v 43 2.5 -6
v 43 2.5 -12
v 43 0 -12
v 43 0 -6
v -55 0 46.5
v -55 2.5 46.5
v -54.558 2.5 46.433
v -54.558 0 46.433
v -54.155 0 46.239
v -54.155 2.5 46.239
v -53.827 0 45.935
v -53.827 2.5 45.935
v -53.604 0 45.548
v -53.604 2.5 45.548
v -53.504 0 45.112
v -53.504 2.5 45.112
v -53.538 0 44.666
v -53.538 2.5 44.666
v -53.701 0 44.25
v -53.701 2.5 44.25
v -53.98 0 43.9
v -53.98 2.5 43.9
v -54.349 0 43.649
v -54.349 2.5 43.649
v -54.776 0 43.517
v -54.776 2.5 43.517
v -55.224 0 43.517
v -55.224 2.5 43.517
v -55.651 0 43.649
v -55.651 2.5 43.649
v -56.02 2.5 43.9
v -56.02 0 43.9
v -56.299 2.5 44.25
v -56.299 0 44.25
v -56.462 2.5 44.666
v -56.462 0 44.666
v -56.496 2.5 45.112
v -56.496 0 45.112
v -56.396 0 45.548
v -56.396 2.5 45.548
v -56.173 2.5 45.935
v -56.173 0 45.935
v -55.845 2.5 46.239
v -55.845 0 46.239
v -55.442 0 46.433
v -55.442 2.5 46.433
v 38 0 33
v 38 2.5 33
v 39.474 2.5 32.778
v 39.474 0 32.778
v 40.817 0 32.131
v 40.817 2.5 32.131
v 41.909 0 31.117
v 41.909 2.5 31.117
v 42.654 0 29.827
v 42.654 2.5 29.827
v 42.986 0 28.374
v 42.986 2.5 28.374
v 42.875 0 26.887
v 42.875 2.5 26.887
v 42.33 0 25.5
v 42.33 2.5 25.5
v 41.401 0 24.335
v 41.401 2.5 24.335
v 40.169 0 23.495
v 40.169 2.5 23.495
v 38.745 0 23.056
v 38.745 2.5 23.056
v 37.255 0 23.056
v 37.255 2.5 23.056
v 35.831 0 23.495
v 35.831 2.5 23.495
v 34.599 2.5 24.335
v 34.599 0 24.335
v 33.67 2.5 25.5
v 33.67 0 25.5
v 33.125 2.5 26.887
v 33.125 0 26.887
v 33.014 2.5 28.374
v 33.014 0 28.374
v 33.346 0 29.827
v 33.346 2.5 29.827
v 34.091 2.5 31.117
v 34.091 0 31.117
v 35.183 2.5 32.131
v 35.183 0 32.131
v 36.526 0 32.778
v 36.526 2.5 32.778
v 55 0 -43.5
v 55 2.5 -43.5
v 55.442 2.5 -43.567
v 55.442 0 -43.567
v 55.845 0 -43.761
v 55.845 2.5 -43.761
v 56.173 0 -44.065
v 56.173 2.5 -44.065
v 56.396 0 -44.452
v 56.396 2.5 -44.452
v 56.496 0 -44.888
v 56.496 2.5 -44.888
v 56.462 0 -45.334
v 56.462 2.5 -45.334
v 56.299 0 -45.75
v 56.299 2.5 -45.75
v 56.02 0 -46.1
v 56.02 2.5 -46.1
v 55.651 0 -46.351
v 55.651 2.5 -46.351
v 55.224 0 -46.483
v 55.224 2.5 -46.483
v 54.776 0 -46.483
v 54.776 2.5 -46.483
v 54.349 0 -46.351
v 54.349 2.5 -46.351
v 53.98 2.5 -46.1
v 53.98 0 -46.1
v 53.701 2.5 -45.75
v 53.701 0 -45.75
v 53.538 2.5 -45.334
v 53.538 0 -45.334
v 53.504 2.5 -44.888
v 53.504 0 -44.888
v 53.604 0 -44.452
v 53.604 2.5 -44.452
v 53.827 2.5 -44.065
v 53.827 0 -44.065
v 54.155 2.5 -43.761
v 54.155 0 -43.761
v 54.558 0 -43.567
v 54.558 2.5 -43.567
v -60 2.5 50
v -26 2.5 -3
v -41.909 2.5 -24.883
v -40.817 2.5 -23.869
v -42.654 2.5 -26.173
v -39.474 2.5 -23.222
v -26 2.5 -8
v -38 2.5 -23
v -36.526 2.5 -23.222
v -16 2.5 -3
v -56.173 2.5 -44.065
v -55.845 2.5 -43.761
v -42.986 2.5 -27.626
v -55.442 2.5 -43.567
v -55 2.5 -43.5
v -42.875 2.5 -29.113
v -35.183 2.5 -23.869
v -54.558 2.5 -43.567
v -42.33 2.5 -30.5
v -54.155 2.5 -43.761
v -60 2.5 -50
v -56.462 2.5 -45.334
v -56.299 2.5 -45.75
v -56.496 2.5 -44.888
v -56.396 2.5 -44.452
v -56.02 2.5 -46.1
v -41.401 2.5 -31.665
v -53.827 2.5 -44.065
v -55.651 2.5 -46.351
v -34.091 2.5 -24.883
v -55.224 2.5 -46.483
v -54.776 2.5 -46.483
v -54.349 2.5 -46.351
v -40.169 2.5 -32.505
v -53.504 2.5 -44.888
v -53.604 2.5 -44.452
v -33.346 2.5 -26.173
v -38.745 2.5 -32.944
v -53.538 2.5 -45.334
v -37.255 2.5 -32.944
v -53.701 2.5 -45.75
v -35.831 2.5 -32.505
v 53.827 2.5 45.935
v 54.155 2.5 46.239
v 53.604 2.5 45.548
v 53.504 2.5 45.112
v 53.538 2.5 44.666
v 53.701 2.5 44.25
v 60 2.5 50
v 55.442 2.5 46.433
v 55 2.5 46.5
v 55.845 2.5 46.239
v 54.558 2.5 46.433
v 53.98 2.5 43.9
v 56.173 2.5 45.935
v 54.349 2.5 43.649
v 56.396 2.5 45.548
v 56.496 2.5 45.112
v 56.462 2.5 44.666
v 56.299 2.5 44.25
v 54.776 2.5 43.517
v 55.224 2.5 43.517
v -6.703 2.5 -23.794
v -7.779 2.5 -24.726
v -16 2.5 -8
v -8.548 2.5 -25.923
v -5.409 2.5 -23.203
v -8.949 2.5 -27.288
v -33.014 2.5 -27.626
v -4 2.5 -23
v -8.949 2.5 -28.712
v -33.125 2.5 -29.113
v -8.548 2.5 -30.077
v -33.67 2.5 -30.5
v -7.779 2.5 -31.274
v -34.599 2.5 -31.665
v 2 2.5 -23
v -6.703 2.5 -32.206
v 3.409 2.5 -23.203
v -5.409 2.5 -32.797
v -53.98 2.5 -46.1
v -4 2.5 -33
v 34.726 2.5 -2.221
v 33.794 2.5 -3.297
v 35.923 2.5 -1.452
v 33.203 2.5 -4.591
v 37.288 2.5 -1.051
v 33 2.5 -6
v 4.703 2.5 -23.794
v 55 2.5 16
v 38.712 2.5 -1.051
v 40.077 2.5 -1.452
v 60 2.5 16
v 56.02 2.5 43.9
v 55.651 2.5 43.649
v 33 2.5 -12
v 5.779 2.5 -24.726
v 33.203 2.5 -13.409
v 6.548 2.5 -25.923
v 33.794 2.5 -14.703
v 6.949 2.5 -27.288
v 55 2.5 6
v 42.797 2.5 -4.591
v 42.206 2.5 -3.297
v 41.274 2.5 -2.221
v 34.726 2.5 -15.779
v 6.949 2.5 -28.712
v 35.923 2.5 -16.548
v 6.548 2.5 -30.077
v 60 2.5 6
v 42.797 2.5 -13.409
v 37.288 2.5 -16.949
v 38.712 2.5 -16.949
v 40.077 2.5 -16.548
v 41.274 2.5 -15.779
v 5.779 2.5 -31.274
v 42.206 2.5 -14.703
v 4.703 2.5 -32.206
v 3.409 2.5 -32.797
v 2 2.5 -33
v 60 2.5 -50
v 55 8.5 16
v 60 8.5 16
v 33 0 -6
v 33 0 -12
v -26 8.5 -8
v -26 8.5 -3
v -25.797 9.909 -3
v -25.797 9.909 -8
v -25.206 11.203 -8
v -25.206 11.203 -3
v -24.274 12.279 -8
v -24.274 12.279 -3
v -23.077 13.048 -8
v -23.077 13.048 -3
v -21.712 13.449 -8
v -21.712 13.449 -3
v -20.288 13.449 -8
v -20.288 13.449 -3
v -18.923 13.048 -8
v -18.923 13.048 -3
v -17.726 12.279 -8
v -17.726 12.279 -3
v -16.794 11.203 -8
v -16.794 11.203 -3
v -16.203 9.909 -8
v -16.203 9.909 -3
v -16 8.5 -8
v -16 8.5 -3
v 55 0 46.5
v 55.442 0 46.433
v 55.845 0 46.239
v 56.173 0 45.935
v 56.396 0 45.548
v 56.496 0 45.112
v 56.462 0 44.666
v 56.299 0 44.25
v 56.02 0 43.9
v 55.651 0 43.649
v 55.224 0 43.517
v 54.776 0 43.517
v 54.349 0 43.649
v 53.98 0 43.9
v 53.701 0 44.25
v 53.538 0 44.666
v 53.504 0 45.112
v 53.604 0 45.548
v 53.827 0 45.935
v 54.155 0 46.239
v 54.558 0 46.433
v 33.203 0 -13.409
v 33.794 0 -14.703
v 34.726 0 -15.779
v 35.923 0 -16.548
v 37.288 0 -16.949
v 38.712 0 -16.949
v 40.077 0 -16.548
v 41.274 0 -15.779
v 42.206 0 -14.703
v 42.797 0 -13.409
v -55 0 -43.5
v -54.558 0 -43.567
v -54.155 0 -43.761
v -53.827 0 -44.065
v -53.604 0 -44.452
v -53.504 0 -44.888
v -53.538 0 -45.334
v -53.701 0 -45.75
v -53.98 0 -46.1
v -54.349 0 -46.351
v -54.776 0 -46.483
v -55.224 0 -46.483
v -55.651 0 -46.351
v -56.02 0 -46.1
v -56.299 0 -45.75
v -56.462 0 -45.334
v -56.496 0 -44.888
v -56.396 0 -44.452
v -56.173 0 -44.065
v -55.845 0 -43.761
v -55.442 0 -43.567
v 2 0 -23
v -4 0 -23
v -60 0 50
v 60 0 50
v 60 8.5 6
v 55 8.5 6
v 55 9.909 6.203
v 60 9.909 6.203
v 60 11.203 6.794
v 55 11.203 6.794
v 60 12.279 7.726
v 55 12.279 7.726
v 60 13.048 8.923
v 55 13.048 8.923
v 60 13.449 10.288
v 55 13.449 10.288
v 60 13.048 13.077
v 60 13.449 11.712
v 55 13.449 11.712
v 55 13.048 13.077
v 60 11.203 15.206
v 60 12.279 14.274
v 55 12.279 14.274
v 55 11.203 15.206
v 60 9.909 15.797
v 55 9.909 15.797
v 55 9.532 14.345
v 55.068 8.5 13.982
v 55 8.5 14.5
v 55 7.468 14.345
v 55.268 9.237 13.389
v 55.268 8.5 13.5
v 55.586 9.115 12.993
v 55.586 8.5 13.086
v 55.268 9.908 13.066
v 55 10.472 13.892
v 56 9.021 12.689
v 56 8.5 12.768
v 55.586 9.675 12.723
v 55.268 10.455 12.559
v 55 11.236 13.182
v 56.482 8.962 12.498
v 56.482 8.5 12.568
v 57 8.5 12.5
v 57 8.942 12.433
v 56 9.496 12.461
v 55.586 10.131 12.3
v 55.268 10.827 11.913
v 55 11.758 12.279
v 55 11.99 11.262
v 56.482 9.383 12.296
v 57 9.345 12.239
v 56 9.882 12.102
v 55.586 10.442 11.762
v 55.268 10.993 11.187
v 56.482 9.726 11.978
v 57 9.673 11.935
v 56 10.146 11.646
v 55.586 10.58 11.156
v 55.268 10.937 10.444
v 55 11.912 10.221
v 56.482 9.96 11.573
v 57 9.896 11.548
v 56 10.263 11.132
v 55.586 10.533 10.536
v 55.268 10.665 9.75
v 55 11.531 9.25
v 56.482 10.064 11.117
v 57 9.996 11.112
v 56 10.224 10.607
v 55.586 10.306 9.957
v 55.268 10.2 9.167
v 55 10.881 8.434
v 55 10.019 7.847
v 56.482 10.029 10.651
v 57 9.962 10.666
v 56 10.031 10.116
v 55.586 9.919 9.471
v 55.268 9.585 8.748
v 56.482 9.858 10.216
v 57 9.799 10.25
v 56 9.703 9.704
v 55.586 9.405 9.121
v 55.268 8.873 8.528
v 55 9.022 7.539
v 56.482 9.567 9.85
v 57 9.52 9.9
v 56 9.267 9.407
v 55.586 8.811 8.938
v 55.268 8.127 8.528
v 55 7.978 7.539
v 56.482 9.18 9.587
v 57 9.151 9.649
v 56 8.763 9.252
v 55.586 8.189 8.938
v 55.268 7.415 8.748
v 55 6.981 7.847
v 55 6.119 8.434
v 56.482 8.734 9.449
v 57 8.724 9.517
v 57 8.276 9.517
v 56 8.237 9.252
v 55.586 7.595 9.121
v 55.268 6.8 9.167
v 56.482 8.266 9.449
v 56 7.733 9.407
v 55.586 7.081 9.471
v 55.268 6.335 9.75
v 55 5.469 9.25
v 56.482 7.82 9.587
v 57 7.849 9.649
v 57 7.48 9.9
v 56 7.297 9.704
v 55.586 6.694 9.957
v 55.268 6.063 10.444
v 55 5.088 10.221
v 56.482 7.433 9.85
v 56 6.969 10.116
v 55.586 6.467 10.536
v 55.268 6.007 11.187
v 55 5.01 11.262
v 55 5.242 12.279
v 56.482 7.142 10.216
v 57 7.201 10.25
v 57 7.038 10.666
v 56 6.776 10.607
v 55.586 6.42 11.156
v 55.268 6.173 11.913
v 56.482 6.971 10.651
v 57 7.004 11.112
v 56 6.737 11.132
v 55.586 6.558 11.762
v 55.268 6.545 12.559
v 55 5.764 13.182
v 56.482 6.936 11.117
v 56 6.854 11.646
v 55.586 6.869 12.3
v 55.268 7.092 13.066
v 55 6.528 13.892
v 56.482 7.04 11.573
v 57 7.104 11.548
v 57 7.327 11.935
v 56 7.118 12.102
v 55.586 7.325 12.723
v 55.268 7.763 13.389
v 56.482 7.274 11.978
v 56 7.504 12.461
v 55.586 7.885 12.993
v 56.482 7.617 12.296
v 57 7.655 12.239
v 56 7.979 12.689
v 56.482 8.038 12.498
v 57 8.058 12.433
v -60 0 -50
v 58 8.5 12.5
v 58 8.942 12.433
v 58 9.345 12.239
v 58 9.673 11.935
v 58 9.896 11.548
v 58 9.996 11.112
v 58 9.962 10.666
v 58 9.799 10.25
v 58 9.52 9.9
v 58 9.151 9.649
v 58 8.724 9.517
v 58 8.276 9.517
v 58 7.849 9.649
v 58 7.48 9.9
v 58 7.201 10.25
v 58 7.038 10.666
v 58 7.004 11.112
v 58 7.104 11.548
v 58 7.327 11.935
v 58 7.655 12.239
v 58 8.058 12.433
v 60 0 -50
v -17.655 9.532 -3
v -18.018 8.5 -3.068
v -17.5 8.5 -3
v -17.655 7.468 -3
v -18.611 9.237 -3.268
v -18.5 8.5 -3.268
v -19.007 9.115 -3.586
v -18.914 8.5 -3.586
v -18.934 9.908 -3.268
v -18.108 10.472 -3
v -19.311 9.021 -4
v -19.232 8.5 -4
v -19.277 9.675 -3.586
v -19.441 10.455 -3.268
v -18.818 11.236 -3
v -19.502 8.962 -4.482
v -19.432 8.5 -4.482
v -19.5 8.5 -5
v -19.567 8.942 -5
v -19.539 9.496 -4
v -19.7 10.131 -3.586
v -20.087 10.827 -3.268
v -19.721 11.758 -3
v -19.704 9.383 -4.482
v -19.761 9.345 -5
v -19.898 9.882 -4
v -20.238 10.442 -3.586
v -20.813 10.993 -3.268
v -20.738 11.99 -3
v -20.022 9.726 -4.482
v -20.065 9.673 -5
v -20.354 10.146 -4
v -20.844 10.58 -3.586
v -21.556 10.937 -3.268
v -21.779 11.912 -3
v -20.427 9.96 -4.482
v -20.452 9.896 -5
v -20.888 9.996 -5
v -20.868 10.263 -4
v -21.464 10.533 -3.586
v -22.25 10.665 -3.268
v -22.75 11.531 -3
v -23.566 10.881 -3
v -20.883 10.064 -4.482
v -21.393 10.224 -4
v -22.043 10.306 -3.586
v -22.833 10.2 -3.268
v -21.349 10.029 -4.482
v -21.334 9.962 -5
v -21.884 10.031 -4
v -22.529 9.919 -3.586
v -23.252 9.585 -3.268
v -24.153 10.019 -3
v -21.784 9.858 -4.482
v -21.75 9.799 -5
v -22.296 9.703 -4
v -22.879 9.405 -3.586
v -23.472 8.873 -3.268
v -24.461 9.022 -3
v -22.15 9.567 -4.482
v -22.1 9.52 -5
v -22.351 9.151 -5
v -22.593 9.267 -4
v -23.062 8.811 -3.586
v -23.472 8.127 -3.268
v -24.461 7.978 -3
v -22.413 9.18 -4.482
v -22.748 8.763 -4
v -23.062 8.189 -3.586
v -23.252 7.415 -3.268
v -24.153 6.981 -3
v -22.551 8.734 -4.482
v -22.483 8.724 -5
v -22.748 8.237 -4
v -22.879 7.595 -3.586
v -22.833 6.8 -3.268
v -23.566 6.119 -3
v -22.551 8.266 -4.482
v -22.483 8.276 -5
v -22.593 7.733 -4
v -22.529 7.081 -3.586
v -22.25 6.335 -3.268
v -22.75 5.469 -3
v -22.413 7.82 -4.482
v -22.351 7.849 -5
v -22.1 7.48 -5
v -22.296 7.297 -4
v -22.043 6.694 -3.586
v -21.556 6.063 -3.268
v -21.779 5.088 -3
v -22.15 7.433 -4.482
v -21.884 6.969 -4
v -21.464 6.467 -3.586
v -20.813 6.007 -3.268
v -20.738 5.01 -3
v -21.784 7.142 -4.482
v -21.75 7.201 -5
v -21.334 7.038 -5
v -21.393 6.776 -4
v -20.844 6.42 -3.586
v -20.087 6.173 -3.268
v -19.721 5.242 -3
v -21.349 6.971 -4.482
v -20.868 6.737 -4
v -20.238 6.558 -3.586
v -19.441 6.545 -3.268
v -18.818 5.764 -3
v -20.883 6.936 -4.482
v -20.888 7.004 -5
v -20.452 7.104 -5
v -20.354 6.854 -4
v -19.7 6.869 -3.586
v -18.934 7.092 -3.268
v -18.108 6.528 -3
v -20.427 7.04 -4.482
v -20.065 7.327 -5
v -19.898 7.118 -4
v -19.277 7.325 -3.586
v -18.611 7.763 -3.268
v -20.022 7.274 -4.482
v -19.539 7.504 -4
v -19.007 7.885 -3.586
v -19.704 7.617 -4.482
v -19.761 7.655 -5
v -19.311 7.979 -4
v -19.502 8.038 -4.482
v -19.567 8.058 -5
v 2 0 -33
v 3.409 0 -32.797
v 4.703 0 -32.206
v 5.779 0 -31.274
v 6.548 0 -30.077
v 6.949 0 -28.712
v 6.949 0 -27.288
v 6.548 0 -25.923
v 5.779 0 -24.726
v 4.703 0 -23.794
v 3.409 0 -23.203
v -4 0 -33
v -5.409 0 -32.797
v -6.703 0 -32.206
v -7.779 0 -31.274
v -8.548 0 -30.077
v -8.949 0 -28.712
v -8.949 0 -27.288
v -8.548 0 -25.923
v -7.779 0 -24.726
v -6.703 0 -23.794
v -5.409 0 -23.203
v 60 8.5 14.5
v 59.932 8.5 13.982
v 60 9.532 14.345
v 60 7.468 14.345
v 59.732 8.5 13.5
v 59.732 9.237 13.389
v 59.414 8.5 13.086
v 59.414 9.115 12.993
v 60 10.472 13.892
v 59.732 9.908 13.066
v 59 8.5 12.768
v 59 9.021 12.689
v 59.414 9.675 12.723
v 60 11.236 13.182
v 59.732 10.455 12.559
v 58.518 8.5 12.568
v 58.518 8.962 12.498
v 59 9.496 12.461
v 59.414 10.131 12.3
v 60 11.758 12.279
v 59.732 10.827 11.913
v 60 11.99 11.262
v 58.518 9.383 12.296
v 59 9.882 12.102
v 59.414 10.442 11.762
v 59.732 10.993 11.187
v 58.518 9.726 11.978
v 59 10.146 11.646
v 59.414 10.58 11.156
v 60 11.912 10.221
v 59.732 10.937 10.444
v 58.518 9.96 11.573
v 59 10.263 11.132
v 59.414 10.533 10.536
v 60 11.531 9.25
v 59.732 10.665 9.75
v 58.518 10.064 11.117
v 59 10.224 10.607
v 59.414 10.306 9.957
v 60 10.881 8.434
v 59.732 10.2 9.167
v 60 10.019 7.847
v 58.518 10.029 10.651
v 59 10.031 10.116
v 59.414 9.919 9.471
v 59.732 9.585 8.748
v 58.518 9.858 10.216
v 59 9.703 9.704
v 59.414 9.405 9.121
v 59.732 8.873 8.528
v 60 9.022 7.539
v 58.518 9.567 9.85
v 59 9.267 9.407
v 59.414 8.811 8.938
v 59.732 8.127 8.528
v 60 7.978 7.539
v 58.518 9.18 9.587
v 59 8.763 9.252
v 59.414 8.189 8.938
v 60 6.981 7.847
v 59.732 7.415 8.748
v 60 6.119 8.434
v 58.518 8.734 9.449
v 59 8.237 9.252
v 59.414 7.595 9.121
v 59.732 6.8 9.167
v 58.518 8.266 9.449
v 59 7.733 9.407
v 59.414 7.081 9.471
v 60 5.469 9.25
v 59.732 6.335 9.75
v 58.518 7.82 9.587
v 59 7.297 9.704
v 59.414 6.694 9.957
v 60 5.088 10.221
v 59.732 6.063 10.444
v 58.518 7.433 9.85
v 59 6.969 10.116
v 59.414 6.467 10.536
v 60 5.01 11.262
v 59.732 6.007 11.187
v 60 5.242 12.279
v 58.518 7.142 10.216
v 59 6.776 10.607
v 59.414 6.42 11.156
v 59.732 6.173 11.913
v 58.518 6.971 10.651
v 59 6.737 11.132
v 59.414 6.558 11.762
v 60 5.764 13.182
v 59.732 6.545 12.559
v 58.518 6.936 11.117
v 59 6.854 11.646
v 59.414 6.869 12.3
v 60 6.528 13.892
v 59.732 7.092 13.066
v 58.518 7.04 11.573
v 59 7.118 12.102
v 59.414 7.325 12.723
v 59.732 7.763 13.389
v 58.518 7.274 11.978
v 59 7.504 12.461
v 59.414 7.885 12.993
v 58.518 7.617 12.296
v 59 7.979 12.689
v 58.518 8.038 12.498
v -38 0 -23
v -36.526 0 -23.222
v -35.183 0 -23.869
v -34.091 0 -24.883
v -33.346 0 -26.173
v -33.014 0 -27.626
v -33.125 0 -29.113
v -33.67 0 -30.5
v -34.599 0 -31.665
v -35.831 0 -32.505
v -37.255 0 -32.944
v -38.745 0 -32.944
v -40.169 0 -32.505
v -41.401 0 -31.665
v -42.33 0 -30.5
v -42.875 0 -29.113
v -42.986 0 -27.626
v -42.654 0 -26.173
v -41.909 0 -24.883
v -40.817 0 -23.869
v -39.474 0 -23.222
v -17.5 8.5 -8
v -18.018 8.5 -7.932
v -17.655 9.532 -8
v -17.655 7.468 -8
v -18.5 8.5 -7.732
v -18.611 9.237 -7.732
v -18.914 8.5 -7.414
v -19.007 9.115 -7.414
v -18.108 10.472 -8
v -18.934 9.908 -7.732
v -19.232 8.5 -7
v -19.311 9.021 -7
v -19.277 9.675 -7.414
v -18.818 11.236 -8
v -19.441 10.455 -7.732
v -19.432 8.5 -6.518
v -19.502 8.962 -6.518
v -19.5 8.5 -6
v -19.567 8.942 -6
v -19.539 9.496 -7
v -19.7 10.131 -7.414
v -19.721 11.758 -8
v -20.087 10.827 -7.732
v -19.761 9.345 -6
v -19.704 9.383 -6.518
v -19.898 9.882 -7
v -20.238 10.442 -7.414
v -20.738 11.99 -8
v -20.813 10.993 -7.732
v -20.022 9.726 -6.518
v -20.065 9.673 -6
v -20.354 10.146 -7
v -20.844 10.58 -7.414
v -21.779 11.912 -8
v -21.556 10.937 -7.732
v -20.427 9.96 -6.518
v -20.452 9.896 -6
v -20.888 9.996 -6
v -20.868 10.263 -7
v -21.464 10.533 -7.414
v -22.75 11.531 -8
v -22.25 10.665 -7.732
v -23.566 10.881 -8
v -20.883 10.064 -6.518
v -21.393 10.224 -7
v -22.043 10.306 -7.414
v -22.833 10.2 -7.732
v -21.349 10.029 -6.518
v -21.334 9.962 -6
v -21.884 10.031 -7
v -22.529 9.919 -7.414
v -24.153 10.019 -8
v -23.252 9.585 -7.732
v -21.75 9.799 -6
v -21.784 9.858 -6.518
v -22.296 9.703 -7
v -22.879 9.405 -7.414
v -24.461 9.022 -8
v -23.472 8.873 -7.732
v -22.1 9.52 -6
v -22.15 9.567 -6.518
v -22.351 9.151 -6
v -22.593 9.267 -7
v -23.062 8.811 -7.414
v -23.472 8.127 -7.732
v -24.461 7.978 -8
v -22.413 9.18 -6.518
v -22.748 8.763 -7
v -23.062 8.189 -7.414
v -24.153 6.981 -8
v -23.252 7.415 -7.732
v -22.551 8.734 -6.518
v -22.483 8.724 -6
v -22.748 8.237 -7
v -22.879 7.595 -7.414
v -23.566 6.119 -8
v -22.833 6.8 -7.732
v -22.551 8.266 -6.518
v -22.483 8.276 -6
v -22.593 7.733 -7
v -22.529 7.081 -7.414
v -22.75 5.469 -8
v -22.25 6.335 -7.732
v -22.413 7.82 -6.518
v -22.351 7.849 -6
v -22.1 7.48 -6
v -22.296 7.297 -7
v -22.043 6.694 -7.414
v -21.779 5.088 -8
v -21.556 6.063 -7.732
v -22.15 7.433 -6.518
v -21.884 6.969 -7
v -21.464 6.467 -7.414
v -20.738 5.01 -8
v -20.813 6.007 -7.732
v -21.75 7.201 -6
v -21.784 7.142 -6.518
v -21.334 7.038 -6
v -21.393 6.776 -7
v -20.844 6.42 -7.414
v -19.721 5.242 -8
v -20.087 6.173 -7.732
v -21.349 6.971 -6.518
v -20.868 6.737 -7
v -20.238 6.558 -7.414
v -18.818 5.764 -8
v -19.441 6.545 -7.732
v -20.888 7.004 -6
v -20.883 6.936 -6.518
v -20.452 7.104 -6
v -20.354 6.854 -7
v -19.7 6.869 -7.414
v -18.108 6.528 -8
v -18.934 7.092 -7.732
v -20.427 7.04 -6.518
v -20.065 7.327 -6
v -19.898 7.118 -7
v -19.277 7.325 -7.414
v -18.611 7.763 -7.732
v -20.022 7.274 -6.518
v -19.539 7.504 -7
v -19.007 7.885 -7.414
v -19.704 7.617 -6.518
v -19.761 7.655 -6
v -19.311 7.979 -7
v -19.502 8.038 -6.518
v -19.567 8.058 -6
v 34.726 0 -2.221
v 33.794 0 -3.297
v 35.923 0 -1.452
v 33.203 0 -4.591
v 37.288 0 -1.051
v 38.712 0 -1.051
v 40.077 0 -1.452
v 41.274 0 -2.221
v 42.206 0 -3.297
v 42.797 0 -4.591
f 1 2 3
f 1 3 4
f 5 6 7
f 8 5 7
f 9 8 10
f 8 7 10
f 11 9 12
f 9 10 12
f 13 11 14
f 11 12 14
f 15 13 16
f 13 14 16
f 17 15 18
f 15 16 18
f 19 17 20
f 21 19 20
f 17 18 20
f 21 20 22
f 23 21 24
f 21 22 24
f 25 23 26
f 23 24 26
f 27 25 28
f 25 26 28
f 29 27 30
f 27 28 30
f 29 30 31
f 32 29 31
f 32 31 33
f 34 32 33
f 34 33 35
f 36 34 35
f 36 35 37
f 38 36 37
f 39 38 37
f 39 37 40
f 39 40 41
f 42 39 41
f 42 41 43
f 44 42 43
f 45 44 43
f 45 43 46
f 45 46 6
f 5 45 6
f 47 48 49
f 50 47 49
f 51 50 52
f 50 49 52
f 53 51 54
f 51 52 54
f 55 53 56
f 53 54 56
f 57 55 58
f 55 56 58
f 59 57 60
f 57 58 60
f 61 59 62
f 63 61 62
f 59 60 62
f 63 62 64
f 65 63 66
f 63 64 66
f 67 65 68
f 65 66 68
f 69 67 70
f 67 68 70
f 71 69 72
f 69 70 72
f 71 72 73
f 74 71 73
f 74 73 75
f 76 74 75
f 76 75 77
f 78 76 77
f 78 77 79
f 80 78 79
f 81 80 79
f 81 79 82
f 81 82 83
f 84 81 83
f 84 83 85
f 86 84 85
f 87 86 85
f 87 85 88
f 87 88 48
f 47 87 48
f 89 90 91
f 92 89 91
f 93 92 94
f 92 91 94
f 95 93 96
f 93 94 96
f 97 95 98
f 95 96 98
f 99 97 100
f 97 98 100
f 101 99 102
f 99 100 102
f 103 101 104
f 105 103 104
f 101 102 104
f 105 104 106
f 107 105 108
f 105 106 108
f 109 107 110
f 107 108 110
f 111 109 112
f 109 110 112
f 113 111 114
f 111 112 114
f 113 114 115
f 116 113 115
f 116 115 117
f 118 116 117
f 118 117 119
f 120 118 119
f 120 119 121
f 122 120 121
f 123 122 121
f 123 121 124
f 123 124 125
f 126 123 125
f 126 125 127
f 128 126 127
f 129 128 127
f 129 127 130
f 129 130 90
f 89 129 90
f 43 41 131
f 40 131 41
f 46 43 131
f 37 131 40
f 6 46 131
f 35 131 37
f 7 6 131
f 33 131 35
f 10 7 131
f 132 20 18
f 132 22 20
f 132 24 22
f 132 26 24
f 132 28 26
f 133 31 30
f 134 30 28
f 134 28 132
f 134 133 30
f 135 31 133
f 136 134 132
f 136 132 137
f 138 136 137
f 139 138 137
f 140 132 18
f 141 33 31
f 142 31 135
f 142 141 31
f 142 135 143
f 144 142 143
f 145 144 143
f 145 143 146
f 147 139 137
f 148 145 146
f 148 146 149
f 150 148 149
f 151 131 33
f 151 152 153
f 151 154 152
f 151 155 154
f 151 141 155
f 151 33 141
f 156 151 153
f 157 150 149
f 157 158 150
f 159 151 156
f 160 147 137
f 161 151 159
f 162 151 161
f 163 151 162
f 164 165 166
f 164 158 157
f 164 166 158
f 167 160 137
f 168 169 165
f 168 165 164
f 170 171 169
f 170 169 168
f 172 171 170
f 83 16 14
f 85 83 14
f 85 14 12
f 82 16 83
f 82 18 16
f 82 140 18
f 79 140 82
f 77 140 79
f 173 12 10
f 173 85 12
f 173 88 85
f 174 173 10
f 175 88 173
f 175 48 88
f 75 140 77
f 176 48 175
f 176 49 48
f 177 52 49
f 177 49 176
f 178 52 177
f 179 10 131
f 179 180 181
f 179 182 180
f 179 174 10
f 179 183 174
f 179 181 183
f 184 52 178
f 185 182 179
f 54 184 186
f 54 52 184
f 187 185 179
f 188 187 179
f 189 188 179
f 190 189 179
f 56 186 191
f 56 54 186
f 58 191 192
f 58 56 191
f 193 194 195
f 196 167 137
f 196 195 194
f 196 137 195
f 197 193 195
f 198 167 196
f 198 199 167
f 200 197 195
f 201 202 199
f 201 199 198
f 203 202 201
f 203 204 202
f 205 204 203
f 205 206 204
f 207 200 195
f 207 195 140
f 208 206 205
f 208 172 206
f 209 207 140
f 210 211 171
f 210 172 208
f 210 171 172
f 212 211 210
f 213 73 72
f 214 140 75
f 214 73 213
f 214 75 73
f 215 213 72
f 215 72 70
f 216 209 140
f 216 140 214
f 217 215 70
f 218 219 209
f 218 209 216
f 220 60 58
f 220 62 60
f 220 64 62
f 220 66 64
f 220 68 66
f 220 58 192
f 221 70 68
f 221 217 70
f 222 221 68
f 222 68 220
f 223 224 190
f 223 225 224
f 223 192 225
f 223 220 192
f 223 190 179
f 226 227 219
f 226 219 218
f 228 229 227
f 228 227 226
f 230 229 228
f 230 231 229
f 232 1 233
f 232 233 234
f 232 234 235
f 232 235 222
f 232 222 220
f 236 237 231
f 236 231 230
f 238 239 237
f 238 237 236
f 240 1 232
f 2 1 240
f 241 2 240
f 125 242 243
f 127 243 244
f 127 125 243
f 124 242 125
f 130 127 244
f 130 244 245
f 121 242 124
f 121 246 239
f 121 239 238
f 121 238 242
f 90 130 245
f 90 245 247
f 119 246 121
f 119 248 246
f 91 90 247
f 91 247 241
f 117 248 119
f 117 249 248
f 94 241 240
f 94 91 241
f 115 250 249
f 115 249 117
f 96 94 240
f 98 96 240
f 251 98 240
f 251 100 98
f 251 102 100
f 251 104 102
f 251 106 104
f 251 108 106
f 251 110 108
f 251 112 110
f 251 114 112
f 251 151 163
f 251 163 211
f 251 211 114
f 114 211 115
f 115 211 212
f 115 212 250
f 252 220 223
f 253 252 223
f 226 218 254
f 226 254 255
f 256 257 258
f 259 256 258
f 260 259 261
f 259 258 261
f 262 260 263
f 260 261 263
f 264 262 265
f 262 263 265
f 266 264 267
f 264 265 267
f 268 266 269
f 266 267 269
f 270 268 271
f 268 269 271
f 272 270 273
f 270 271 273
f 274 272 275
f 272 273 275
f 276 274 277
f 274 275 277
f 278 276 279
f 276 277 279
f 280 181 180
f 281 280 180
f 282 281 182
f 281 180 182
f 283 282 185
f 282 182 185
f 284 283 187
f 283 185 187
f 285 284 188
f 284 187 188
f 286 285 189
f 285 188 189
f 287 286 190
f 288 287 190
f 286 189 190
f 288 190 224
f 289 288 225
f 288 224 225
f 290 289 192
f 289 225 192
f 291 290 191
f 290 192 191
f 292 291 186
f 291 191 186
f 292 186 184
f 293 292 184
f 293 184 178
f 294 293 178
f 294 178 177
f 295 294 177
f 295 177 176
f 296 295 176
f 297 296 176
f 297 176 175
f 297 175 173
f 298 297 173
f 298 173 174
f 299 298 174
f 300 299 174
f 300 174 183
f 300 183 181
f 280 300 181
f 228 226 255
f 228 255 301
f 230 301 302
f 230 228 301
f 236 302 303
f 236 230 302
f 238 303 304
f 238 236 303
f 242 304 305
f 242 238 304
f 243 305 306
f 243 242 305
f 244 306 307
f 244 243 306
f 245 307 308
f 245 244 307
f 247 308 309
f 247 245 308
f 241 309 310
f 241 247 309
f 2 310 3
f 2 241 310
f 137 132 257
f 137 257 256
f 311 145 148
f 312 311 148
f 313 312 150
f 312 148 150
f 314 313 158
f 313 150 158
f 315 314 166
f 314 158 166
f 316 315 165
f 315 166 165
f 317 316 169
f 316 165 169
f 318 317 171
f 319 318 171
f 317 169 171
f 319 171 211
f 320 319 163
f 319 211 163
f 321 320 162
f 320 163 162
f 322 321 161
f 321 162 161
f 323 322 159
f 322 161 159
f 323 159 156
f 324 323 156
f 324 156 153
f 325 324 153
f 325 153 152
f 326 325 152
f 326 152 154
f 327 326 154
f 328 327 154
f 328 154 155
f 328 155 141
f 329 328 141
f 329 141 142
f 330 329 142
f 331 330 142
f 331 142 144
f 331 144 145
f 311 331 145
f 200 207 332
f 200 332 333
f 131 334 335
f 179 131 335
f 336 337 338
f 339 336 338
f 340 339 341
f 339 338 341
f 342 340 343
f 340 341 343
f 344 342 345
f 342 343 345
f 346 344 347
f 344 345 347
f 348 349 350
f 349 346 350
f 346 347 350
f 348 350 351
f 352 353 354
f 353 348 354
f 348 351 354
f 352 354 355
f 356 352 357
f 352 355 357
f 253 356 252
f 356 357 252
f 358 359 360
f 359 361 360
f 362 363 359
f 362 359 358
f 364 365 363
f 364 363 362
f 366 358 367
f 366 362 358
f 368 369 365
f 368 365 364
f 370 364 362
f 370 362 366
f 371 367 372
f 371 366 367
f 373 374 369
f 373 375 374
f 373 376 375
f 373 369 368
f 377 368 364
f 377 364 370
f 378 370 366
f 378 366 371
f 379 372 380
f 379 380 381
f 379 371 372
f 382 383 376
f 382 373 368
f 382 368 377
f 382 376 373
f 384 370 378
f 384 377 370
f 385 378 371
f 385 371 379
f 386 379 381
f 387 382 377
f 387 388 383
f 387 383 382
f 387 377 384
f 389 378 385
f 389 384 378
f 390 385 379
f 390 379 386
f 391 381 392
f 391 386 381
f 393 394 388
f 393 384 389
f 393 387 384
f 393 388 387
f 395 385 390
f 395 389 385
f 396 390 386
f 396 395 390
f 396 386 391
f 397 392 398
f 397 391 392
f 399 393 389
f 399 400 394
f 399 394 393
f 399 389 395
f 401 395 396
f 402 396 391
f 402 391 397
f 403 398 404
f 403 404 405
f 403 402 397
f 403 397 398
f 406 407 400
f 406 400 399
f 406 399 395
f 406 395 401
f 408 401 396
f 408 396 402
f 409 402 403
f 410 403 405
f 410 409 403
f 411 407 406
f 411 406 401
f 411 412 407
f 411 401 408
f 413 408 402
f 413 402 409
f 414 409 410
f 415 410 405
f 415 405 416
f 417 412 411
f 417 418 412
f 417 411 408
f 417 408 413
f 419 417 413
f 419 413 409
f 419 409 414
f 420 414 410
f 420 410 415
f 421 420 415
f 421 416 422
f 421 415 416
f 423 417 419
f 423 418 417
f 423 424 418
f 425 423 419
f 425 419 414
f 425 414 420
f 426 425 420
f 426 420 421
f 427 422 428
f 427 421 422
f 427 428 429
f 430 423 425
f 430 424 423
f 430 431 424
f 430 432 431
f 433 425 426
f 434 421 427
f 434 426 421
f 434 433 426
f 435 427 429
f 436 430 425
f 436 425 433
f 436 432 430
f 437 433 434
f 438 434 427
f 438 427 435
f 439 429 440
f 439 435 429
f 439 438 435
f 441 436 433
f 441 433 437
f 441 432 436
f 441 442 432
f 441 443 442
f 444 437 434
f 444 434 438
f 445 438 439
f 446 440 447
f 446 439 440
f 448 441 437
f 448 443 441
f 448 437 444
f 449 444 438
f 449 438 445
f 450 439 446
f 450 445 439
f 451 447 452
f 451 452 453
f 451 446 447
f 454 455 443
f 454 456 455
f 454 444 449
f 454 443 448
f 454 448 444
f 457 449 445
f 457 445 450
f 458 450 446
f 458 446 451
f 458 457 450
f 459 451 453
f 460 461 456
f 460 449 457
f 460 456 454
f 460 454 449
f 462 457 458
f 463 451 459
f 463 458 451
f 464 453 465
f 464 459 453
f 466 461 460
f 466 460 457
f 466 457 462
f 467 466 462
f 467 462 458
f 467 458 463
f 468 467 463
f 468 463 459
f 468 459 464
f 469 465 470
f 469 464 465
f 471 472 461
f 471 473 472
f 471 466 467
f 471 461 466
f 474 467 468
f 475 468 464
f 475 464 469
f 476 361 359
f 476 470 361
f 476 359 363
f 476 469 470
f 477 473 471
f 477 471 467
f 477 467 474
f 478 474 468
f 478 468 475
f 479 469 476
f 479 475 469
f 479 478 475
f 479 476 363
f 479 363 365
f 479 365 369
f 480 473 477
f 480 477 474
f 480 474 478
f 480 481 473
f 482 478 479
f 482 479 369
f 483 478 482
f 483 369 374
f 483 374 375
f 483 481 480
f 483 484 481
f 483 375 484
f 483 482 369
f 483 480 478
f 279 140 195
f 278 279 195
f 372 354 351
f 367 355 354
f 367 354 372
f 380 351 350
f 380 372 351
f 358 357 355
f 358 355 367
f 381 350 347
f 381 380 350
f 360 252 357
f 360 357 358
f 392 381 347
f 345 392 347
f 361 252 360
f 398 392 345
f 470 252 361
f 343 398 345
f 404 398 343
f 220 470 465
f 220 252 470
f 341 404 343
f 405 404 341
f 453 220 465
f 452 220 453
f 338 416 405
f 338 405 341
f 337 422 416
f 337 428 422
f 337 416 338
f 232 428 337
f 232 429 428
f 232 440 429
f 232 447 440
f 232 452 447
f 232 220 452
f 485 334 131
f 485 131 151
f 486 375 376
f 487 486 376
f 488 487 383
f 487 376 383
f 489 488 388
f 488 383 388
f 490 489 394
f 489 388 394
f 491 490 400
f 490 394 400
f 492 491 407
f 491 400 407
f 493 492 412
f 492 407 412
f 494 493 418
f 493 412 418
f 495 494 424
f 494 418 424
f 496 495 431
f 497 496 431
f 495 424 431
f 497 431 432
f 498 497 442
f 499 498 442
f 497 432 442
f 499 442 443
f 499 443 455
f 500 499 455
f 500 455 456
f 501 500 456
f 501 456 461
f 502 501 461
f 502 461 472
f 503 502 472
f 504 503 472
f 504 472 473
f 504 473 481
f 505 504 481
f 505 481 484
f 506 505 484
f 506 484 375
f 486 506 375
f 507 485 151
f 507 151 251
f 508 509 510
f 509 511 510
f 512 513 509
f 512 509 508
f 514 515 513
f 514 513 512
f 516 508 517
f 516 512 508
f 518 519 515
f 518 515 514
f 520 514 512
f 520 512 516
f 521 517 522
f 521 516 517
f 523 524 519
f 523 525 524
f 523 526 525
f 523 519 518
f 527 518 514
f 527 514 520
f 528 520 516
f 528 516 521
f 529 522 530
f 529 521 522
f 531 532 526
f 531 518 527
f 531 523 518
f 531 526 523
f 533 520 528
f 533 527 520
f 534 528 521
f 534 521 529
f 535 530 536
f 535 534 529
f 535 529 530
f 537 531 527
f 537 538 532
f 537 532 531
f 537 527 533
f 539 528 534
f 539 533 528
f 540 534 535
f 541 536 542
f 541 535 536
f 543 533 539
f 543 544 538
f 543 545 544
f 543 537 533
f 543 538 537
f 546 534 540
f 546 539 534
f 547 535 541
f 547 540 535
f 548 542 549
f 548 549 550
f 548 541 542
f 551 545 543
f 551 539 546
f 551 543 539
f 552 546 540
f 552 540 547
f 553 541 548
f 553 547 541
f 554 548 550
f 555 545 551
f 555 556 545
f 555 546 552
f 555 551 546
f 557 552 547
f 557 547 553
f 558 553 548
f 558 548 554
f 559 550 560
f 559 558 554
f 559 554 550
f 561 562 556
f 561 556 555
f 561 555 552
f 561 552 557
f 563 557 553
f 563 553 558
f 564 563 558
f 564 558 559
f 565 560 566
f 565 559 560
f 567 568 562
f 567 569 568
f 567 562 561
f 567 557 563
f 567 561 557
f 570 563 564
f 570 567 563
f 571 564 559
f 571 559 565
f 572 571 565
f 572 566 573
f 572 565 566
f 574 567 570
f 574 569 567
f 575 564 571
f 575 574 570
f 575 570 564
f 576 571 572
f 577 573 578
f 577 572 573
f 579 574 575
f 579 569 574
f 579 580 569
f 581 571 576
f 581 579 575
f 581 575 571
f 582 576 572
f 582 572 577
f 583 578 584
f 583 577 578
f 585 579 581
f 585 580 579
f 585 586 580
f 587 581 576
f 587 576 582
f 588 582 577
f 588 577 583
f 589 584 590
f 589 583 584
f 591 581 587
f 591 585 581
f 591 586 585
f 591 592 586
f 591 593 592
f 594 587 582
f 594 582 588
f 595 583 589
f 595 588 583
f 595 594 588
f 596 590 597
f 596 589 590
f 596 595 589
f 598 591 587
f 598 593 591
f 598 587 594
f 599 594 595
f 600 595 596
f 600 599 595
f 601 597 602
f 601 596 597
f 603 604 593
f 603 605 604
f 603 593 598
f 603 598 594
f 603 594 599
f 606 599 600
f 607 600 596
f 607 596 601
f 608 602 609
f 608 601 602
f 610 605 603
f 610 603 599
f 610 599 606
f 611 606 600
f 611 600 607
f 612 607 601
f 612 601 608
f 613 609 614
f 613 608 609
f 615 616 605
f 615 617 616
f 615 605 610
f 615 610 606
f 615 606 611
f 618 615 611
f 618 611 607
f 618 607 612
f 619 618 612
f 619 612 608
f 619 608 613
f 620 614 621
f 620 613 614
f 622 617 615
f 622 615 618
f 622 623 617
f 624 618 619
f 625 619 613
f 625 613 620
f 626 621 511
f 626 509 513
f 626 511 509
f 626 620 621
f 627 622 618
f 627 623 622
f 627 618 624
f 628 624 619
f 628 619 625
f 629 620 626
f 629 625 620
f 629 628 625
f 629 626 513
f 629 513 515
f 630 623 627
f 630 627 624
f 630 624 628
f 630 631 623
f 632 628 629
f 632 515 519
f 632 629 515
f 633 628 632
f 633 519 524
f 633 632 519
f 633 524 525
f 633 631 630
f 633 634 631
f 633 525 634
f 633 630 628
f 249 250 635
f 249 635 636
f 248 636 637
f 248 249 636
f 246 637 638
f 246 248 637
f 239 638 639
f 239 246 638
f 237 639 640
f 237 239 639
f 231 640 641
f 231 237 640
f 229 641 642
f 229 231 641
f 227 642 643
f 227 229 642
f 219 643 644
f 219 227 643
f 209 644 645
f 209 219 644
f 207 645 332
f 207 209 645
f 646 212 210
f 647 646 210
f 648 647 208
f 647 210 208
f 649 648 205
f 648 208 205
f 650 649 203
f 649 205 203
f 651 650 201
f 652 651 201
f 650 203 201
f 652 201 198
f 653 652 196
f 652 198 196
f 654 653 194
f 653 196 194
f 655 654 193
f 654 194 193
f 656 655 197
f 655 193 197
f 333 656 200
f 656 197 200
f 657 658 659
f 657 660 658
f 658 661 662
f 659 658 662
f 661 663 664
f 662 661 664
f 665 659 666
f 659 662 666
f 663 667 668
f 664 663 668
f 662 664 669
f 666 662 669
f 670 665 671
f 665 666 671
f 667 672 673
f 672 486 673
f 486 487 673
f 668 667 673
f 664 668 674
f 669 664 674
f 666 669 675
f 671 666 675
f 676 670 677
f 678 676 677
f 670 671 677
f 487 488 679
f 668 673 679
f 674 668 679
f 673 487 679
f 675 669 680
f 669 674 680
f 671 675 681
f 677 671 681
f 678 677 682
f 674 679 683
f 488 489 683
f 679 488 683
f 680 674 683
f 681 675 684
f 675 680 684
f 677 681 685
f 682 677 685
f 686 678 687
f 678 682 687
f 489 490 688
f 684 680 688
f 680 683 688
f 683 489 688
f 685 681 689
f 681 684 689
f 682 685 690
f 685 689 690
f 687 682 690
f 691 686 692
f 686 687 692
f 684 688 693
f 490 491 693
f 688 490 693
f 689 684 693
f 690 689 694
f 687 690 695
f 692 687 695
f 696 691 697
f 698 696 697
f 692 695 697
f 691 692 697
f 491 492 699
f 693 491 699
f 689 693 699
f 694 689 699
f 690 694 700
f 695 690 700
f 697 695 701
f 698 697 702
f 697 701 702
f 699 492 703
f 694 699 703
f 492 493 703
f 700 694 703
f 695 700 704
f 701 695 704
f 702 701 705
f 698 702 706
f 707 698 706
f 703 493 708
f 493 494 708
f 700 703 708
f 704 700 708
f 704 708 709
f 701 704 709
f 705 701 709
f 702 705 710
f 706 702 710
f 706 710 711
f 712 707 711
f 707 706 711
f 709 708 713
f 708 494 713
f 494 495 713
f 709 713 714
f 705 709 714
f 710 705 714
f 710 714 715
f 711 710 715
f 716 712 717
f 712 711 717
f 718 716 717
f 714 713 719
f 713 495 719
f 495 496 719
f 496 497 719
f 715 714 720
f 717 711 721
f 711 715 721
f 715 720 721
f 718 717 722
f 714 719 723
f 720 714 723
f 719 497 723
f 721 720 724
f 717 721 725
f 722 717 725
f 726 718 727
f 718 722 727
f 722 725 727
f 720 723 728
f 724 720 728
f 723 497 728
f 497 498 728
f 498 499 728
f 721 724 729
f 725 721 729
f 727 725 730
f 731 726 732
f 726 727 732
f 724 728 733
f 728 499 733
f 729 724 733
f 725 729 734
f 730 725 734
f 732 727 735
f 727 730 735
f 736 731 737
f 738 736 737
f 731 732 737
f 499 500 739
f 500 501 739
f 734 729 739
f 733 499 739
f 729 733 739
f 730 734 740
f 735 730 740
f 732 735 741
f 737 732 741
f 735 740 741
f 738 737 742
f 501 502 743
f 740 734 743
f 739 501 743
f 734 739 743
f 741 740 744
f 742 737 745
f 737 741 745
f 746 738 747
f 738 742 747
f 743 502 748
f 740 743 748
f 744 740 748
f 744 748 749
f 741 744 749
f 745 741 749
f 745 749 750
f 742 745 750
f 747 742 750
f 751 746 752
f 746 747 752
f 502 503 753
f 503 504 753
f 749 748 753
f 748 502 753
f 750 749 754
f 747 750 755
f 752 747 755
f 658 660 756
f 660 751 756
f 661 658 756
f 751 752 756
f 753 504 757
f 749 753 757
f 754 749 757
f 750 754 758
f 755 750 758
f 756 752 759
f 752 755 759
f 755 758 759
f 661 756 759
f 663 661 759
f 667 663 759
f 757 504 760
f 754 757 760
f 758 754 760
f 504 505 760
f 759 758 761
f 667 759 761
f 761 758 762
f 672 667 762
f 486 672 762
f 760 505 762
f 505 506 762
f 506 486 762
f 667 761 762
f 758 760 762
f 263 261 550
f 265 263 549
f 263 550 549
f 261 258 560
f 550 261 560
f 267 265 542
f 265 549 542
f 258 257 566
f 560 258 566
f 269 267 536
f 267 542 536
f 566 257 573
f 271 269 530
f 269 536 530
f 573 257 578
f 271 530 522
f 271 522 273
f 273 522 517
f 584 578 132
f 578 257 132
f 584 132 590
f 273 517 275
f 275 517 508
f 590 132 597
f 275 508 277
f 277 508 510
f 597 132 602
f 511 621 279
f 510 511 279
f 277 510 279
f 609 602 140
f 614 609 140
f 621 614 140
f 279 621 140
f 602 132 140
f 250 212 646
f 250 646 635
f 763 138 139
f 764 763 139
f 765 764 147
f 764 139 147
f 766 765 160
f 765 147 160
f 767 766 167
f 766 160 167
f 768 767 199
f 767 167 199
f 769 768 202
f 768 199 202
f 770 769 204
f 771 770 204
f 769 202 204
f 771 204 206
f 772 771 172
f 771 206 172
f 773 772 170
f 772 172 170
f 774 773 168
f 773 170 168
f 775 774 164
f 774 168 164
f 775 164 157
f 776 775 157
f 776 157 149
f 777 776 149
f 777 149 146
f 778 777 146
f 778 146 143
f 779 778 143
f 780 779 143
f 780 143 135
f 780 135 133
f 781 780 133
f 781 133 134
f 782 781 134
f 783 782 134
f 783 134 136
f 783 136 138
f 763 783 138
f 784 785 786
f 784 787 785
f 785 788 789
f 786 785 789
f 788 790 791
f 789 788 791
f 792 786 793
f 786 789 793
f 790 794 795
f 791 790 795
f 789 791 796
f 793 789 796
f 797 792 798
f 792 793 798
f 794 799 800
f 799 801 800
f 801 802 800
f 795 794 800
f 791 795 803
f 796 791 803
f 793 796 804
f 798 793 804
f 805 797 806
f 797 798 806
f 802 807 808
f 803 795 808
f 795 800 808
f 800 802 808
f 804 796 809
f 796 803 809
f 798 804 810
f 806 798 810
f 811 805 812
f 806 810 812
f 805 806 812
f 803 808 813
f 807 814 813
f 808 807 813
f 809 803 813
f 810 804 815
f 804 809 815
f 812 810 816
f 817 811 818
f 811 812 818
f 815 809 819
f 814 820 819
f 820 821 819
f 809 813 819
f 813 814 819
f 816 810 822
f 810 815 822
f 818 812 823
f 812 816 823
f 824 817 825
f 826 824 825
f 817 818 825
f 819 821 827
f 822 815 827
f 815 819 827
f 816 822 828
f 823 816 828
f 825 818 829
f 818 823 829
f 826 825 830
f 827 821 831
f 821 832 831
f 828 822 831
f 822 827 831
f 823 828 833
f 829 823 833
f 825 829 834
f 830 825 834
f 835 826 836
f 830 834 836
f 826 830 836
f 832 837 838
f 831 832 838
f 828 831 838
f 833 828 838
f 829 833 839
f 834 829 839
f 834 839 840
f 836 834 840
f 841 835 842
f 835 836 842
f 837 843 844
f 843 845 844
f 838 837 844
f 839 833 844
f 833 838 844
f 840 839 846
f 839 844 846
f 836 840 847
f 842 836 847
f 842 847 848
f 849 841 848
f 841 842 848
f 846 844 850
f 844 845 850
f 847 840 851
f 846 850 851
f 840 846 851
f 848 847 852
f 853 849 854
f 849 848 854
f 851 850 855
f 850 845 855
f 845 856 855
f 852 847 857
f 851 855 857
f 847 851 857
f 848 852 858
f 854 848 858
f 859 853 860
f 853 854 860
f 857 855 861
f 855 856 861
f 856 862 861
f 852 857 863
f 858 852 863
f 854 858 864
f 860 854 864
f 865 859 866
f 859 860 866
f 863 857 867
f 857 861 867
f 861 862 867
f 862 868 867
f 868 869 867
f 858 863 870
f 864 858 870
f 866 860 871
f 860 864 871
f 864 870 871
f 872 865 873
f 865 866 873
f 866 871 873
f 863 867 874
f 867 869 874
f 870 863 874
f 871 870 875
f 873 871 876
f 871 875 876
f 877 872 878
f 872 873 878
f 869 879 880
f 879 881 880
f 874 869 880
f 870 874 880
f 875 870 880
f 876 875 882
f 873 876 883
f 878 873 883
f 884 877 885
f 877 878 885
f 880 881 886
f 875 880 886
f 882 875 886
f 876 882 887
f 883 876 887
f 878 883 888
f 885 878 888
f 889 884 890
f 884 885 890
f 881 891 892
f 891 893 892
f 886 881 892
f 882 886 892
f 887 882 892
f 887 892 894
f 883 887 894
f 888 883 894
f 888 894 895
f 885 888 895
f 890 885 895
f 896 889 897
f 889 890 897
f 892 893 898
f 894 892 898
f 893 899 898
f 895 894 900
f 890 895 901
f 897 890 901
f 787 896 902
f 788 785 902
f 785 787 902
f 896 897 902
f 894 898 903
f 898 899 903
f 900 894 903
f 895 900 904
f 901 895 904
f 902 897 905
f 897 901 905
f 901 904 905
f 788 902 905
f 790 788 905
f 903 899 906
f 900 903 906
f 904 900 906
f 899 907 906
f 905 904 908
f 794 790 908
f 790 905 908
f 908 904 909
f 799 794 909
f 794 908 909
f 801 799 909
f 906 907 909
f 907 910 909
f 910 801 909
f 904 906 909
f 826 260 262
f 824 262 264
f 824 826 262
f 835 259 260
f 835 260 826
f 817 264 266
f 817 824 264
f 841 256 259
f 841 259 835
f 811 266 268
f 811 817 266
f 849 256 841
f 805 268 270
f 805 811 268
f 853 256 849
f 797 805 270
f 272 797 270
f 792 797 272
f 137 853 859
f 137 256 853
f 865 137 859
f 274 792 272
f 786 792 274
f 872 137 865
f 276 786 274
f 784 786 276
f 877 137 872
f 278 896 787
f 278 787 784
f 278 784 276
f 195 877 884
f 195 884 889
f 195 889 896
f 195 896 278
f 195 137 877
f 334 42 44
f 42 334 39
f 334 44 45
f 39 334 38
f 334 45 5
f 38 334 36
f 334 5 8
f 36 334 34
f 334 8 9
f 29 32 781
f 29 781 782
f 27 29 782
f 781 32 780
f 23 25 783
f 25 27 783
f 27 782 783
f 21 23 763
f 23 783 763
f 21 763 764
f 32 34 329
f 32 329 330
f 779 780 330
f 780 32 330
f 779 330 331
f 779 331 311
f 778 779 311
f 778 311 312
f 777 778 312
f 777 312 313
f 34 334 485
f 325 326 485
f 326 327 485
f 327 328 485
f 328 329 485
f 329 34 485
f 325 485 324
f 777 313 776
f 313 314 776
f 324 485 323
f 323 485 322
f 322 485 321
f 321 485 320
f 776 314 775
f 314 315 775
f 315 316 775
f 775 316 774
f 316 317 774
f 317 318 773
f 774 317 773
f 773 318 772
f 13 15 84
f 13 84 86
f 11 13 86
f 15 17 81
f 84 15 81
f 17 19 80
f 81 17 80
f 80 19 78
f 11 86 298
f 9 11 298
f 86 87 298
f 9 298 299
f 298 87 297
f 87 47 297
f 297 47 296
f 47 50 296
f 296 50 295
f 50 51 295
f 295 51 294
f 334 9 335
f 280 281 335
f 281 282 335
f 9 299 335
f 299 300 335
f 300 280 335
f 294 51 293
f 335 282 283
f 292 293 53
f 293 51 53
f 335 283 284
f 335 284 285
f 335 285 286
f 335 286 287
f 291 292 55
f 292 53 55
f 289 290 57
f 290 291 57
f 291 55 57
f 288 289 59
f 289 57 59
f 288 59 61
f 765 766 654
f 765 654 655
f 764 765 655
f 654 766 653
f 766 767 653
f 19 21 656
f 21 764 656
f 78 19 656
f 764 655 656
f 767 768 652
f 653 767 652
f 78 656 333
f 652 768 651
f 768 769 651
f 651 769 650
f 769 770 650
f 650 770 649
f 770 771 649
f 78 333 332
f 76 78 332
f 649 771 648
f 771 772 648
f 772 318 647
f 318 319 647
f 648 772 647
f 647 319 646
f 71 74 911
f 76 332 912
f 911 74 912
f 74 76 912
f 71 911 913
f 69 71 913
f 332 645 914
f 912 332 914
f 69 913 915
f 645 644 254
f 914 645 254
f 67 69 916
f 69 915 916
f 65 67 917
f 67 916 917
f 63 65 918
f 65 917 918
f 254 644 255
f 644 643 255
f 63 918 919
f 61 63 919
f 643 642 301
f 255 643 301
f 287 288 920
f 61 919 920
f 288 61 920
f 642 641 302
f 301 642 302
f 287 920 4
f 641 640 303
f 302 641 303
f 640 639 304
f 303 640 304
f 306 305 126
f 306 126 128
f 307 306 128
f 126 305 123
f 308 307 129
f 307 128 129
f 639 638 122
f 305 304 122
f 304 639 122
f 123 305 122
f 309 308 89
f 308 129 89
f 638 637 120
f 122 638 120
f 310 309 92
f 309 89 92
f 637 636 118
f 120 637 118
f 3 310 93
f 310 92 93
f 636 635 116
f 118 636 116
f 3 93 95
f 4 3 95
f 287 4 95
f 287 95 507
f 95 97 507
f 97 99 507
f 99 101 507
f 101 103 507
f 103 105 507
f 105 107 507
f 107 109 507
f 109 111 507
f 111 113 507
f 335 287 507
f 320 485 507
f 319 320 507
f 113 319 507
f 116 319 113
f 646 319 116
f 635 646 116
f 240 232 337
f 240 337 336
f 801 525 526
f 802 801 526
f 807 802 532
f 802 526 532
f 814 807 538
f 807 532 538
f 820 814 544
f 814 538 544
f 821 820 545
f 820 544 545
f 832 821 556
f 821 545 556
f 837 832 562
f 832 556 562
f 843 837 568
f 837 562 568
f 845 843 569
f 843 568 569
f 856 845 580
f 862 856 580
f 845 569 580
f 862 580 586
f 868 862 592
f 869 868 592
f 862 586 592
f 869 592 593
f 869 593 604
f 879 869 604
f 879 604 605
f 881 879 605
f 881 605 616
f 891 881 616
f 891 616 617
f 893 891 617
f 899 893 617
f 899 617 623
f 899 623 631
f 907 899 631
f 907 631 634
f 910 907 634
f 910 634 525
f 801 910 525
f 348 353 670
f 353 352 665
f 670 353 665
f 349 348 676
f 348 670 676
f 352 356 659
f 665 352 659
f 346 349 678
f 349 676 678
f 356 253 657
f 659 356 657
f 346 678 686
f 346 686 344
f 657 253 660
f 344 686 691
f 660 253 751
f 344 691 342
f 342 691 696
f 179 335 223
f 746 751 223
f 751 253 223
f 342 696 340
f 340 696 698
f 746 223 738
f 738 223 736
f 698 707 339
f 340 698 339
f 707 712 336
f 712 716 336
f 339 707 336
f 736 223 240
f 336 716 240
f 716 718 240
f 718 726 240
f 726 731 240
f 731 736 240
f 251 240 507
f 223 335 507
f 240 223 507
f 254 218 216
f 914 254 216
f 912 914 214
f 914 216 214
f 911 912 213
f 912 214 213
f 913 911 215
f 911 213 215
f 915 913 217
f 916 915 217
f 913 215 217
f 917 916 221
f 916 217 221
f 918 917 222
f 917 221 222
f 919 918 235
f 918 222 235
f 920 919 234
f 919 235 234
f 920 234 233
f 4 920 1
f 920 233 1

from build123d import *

# Parameters (mm, degrees)
SKETCH2_W           = 120
SKETCH2_H           = 100
BOSS_EXTRUDE1_DEPTH = 2.5
SKETCH3_R           = 1.5
CUT_EXTRUDE1_DEPTH  = 5
SKETCH4_R           = 5
CUT_EXTRUDE2_DEPTH  = 5
CUT_EXTRUDE3_DEPTH  = 10
SKETCH6_W           = 10
SKETCH6_H           = 5
SKETCH6_W_2         = 5
SKETCH6_H_2         = 10
BOSS_EXTRUDE2_DEPTH = 15
SKETCH7_R           = 1.5
CUT_EXTRUDE4_DEPTH  = 82.946628973
SKETCH8_R           = 1.5
CUT_EXTRUDE5_DEPTH  = 99.001275502
FILLET1_R           = 2
SKETCH9_W           = 10
SKETCH9_H           = 5
SKETCH9_W_2         = 5
SKETCH9_H_2         = 10
CUT_EXTRUDE6_DEPTH  = 15


with BuildPart() as part:
    # Sketch2 → Boss-Extrude1 (new body)
    with BuildSketch(Plane(origin=(0, 0, 0), x_dir=(1, 0, 0), z_dir=(0, 1, 0))):
        Rectangle(SKETCH2_W, SKETCH2_H)
    extrude(amount=BOSS_EXTRUDE1_DEPTH)

    # Sketch3 → Cut-Extrude1 (cut)
    with BuildSketch(Plane(origin=(0, 2.5, 0), x_dir=(1, 0, 0), z_dir=(0, 1, 0))):
        with Locations(Location((-55, 45, 0), (0, 0, 270))):
            Circle(SKETCH3_R)
        with Locations(Location((55, 45, 0), (0, 0, 270))):
            Circle(SKETCH3_R)
        with Locations(Location((55, -45, 0), (0, 0, 270))):
            Circle(SKETCH3_R)
        with Locations(Location((-55, -45, 0), (0, 0, 270))):
            Circle(SKETCH3_R)
    extrude(amount=-CUT_EXTRUDE1_DEPTH, mode=Mode.SUBTRACT)

    # Sketch4 → Cut-Extrude2 (cut)
    with BuildSketch(Plane(origin=(0, 2.5, 0), x_dir=(1, 0, 0), z_dir=(0, 1, 0))):
        with Locations(Location((-38, 28, 0), (0, 0, 270))):
            Circle(SKETCH4_R)
        with Locations(Location((-4, 28, 0), (0, 0, 270))):
            Circle(SKETCH4_R)
        with Locations(Location((38, 6, 0), (0, 0, 270))):
            Circle(SKETCH4_R)
        with Locations(Location((38, -28, 0), (0, 0, 270))):
            Circle(SKETCH4_R)
    extrude(amount=-CUT_EXTRUDE2_DEPTH, mode=Mode.SUBTRACT)

    # Sketch5 → Cut-Extrude3 (cut)
    with BuildSketch(Plane(origin=(0, 2.5, 0), x_dir=(1, 0, 0), z_dir=(0, 1, 0))):
        with BuildLine():
            Line((-4, 33), (2, 33))
            ThreePointArc((2, 33), (7, 28), (2, 23))
            Line((2, 23), (-4, 23))
            ThreePointArc((-4, 23), (-9, 28), (-4, 33))
        make_face()
        with BuildLine():
            Line((33, 6), (33, 12))
            ThreePointArc((33, 12), (38, 17), (43, 12))
            Line((43, 12), (43, 6))
            ThreePointArc((43, 6), (38, 1), (33, 6))
        make_face()
    extrude(amount=-CUT_EXTRUDE3_DEPTH, mode=Mode.SUBTRACT)

    # Sketch6 → Boss-Extrude2 (add)
    with BuildSketch(Plane(origin=(0, 2.5, 0), x_dir=(1, 0, 0), z_dir=(0, 1, 0))):
        with Locations((-21, 5.5)):
            Rectangle(SKETCH6_W, SKETCH6_H)
        with Locations((57.5, -11)):
            Rectangle(SKETCH6_W_2, SKETCH6_H_2)
        with Locations((-21, 47.5)):
            Rectangle(SKETCH6_W, SKETCH6_H)
        with Locations((15.5, -11)):
            Rectangle(SKETCH6_W_2, SKETCH6_H_2)
    extrude(amount=BOSS_EXTRUDE2_DEPTH)

    # Sketch7 → Cut-Extrude4 (cut, through all)
    with BuildSketch(Plane.XY.offset(-3)):
        with Locations((-21, 8.5)):
            Circle(SKETCH7_R)
        with BuildLine():
            Line((-16, 8.5), (-16, 17.5))
            Line((-16, 17.5), (-26, 17.5))
            Line((-26, 17.5), (-26, 8.5))
            ThreePointArc((-26, 8.5), (-21, 13.5), (-16, 8.5))
        make_face()
    extrude(amount=-CUT_EXTRUDE4_DEPTH, mode=Mode.SUBTRACT)

    # Sketch8 → Cut-Extrude5 (cut, through all)
    with BuildSketch(Plane(origin=(13, 0, -13), x_dir=(0, 0, 1), z_dir=(-1, 0, 0))):
        with Locations((24, 8.5)):
            Circle(SKETCH8_R)
        with BuildLine():
            Line((29, 8.5), (29, 17.5))
            Line((29, 17.5), (19, 17.5))
            Line((19, 17.5), (19, 8.5))
            ThreePointArc((19, 8.5), (24, 13.5), (29, 8.5))
        make_face()
    extrude(amount=-CUT_EXTRUDE5_DEPTH, mode=Mode.SUBTRACT)

    # Fillet1
    fillet1_edges = [part.edges().sort_by_distance(p)[0] for p in [
        (-22.5, 8.5, -8),
        (-22.5, 8.5, -50),
        (-22.5, 8.5, -45),
        (-22.5, 8.5, -3),
        (60, 8.5, 9.5),
        (55, 8.5, 9.5),
        (18, 8.5, 9.5),
        (13, 8.5, 9.5),
    ]]
    fillet(fillet1_edges, radius=FILLET1_R)

    # Sketch9 → Cut-Extrude6 (cut)
    with BuildSketch(Plane(origin=(0, 2.5, 0), x_dir=(1, 0, 0), z_dir=(0, 1, 0))):
        with Locations((-21, 47.5)):
            Rectangle(SKETCH9_W, SKETCH9_H)
        with Locations((15.5, -11)):
            Rectangle(SKETCH9_W_2, SKETCH9_H_2)
    extrude(amount=CUT_EXTRUDE6_DEPTH, mode=Mode.SUBTRACT)


solid = part.part
